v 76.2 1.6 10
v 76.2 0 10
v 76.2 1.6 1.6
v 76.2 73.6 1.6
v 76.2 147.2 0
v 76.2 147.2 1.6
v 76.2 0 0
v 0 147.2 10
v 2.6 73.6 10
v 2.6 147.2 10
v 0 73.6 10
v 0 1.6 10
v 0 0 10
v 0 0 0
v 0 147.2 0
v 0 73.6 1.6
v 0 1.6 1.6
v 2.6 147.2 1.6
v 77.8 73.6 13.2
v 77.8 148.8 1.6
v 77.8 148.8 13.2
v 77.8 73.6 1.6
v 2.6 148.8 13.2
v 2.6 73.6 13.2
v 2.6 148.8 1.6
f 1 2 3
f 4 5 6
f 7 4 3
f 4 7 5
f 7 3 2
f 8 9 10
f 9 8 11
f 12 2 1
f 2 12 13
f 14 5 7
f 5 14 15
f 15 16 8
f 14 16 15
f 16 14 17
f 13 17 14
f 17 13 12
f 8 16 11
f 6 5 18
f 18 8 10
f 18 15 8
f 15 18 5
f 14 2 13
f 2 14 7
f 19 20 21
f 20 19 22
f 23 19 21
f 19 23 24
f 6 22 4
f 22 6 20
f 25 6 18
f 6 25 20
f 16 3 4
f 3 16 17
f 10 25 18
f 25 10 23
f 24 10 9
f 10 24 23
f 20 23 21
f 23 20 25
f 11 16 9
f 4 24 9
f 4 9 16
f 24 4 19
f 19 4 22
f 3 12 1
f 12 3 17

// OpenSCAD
width = 73;
length = 144;
height = 10;
wall = 0.8*2;

difference()
{
    case();
    translate([wall, wall, wall])
//    mobil();
    translate([-width/2,  0,  0])
    cube([width*2, length/2, 20]);
}

module mobil()
{
    hull()
    {
        cube([width, length, height]);
        translate([1,1,wall])
        cube([width-2, length-2, height]);
    }
}

module case()
{
    //hull()
    {
        cube([width+wall*2, length+wall*2, height]);
        translate([wall+1, wall+1, wall])
        cube([width+wall*2-1, length+wall*2-1, height+wall]);
    }
}

module usb_hole()
{
}
